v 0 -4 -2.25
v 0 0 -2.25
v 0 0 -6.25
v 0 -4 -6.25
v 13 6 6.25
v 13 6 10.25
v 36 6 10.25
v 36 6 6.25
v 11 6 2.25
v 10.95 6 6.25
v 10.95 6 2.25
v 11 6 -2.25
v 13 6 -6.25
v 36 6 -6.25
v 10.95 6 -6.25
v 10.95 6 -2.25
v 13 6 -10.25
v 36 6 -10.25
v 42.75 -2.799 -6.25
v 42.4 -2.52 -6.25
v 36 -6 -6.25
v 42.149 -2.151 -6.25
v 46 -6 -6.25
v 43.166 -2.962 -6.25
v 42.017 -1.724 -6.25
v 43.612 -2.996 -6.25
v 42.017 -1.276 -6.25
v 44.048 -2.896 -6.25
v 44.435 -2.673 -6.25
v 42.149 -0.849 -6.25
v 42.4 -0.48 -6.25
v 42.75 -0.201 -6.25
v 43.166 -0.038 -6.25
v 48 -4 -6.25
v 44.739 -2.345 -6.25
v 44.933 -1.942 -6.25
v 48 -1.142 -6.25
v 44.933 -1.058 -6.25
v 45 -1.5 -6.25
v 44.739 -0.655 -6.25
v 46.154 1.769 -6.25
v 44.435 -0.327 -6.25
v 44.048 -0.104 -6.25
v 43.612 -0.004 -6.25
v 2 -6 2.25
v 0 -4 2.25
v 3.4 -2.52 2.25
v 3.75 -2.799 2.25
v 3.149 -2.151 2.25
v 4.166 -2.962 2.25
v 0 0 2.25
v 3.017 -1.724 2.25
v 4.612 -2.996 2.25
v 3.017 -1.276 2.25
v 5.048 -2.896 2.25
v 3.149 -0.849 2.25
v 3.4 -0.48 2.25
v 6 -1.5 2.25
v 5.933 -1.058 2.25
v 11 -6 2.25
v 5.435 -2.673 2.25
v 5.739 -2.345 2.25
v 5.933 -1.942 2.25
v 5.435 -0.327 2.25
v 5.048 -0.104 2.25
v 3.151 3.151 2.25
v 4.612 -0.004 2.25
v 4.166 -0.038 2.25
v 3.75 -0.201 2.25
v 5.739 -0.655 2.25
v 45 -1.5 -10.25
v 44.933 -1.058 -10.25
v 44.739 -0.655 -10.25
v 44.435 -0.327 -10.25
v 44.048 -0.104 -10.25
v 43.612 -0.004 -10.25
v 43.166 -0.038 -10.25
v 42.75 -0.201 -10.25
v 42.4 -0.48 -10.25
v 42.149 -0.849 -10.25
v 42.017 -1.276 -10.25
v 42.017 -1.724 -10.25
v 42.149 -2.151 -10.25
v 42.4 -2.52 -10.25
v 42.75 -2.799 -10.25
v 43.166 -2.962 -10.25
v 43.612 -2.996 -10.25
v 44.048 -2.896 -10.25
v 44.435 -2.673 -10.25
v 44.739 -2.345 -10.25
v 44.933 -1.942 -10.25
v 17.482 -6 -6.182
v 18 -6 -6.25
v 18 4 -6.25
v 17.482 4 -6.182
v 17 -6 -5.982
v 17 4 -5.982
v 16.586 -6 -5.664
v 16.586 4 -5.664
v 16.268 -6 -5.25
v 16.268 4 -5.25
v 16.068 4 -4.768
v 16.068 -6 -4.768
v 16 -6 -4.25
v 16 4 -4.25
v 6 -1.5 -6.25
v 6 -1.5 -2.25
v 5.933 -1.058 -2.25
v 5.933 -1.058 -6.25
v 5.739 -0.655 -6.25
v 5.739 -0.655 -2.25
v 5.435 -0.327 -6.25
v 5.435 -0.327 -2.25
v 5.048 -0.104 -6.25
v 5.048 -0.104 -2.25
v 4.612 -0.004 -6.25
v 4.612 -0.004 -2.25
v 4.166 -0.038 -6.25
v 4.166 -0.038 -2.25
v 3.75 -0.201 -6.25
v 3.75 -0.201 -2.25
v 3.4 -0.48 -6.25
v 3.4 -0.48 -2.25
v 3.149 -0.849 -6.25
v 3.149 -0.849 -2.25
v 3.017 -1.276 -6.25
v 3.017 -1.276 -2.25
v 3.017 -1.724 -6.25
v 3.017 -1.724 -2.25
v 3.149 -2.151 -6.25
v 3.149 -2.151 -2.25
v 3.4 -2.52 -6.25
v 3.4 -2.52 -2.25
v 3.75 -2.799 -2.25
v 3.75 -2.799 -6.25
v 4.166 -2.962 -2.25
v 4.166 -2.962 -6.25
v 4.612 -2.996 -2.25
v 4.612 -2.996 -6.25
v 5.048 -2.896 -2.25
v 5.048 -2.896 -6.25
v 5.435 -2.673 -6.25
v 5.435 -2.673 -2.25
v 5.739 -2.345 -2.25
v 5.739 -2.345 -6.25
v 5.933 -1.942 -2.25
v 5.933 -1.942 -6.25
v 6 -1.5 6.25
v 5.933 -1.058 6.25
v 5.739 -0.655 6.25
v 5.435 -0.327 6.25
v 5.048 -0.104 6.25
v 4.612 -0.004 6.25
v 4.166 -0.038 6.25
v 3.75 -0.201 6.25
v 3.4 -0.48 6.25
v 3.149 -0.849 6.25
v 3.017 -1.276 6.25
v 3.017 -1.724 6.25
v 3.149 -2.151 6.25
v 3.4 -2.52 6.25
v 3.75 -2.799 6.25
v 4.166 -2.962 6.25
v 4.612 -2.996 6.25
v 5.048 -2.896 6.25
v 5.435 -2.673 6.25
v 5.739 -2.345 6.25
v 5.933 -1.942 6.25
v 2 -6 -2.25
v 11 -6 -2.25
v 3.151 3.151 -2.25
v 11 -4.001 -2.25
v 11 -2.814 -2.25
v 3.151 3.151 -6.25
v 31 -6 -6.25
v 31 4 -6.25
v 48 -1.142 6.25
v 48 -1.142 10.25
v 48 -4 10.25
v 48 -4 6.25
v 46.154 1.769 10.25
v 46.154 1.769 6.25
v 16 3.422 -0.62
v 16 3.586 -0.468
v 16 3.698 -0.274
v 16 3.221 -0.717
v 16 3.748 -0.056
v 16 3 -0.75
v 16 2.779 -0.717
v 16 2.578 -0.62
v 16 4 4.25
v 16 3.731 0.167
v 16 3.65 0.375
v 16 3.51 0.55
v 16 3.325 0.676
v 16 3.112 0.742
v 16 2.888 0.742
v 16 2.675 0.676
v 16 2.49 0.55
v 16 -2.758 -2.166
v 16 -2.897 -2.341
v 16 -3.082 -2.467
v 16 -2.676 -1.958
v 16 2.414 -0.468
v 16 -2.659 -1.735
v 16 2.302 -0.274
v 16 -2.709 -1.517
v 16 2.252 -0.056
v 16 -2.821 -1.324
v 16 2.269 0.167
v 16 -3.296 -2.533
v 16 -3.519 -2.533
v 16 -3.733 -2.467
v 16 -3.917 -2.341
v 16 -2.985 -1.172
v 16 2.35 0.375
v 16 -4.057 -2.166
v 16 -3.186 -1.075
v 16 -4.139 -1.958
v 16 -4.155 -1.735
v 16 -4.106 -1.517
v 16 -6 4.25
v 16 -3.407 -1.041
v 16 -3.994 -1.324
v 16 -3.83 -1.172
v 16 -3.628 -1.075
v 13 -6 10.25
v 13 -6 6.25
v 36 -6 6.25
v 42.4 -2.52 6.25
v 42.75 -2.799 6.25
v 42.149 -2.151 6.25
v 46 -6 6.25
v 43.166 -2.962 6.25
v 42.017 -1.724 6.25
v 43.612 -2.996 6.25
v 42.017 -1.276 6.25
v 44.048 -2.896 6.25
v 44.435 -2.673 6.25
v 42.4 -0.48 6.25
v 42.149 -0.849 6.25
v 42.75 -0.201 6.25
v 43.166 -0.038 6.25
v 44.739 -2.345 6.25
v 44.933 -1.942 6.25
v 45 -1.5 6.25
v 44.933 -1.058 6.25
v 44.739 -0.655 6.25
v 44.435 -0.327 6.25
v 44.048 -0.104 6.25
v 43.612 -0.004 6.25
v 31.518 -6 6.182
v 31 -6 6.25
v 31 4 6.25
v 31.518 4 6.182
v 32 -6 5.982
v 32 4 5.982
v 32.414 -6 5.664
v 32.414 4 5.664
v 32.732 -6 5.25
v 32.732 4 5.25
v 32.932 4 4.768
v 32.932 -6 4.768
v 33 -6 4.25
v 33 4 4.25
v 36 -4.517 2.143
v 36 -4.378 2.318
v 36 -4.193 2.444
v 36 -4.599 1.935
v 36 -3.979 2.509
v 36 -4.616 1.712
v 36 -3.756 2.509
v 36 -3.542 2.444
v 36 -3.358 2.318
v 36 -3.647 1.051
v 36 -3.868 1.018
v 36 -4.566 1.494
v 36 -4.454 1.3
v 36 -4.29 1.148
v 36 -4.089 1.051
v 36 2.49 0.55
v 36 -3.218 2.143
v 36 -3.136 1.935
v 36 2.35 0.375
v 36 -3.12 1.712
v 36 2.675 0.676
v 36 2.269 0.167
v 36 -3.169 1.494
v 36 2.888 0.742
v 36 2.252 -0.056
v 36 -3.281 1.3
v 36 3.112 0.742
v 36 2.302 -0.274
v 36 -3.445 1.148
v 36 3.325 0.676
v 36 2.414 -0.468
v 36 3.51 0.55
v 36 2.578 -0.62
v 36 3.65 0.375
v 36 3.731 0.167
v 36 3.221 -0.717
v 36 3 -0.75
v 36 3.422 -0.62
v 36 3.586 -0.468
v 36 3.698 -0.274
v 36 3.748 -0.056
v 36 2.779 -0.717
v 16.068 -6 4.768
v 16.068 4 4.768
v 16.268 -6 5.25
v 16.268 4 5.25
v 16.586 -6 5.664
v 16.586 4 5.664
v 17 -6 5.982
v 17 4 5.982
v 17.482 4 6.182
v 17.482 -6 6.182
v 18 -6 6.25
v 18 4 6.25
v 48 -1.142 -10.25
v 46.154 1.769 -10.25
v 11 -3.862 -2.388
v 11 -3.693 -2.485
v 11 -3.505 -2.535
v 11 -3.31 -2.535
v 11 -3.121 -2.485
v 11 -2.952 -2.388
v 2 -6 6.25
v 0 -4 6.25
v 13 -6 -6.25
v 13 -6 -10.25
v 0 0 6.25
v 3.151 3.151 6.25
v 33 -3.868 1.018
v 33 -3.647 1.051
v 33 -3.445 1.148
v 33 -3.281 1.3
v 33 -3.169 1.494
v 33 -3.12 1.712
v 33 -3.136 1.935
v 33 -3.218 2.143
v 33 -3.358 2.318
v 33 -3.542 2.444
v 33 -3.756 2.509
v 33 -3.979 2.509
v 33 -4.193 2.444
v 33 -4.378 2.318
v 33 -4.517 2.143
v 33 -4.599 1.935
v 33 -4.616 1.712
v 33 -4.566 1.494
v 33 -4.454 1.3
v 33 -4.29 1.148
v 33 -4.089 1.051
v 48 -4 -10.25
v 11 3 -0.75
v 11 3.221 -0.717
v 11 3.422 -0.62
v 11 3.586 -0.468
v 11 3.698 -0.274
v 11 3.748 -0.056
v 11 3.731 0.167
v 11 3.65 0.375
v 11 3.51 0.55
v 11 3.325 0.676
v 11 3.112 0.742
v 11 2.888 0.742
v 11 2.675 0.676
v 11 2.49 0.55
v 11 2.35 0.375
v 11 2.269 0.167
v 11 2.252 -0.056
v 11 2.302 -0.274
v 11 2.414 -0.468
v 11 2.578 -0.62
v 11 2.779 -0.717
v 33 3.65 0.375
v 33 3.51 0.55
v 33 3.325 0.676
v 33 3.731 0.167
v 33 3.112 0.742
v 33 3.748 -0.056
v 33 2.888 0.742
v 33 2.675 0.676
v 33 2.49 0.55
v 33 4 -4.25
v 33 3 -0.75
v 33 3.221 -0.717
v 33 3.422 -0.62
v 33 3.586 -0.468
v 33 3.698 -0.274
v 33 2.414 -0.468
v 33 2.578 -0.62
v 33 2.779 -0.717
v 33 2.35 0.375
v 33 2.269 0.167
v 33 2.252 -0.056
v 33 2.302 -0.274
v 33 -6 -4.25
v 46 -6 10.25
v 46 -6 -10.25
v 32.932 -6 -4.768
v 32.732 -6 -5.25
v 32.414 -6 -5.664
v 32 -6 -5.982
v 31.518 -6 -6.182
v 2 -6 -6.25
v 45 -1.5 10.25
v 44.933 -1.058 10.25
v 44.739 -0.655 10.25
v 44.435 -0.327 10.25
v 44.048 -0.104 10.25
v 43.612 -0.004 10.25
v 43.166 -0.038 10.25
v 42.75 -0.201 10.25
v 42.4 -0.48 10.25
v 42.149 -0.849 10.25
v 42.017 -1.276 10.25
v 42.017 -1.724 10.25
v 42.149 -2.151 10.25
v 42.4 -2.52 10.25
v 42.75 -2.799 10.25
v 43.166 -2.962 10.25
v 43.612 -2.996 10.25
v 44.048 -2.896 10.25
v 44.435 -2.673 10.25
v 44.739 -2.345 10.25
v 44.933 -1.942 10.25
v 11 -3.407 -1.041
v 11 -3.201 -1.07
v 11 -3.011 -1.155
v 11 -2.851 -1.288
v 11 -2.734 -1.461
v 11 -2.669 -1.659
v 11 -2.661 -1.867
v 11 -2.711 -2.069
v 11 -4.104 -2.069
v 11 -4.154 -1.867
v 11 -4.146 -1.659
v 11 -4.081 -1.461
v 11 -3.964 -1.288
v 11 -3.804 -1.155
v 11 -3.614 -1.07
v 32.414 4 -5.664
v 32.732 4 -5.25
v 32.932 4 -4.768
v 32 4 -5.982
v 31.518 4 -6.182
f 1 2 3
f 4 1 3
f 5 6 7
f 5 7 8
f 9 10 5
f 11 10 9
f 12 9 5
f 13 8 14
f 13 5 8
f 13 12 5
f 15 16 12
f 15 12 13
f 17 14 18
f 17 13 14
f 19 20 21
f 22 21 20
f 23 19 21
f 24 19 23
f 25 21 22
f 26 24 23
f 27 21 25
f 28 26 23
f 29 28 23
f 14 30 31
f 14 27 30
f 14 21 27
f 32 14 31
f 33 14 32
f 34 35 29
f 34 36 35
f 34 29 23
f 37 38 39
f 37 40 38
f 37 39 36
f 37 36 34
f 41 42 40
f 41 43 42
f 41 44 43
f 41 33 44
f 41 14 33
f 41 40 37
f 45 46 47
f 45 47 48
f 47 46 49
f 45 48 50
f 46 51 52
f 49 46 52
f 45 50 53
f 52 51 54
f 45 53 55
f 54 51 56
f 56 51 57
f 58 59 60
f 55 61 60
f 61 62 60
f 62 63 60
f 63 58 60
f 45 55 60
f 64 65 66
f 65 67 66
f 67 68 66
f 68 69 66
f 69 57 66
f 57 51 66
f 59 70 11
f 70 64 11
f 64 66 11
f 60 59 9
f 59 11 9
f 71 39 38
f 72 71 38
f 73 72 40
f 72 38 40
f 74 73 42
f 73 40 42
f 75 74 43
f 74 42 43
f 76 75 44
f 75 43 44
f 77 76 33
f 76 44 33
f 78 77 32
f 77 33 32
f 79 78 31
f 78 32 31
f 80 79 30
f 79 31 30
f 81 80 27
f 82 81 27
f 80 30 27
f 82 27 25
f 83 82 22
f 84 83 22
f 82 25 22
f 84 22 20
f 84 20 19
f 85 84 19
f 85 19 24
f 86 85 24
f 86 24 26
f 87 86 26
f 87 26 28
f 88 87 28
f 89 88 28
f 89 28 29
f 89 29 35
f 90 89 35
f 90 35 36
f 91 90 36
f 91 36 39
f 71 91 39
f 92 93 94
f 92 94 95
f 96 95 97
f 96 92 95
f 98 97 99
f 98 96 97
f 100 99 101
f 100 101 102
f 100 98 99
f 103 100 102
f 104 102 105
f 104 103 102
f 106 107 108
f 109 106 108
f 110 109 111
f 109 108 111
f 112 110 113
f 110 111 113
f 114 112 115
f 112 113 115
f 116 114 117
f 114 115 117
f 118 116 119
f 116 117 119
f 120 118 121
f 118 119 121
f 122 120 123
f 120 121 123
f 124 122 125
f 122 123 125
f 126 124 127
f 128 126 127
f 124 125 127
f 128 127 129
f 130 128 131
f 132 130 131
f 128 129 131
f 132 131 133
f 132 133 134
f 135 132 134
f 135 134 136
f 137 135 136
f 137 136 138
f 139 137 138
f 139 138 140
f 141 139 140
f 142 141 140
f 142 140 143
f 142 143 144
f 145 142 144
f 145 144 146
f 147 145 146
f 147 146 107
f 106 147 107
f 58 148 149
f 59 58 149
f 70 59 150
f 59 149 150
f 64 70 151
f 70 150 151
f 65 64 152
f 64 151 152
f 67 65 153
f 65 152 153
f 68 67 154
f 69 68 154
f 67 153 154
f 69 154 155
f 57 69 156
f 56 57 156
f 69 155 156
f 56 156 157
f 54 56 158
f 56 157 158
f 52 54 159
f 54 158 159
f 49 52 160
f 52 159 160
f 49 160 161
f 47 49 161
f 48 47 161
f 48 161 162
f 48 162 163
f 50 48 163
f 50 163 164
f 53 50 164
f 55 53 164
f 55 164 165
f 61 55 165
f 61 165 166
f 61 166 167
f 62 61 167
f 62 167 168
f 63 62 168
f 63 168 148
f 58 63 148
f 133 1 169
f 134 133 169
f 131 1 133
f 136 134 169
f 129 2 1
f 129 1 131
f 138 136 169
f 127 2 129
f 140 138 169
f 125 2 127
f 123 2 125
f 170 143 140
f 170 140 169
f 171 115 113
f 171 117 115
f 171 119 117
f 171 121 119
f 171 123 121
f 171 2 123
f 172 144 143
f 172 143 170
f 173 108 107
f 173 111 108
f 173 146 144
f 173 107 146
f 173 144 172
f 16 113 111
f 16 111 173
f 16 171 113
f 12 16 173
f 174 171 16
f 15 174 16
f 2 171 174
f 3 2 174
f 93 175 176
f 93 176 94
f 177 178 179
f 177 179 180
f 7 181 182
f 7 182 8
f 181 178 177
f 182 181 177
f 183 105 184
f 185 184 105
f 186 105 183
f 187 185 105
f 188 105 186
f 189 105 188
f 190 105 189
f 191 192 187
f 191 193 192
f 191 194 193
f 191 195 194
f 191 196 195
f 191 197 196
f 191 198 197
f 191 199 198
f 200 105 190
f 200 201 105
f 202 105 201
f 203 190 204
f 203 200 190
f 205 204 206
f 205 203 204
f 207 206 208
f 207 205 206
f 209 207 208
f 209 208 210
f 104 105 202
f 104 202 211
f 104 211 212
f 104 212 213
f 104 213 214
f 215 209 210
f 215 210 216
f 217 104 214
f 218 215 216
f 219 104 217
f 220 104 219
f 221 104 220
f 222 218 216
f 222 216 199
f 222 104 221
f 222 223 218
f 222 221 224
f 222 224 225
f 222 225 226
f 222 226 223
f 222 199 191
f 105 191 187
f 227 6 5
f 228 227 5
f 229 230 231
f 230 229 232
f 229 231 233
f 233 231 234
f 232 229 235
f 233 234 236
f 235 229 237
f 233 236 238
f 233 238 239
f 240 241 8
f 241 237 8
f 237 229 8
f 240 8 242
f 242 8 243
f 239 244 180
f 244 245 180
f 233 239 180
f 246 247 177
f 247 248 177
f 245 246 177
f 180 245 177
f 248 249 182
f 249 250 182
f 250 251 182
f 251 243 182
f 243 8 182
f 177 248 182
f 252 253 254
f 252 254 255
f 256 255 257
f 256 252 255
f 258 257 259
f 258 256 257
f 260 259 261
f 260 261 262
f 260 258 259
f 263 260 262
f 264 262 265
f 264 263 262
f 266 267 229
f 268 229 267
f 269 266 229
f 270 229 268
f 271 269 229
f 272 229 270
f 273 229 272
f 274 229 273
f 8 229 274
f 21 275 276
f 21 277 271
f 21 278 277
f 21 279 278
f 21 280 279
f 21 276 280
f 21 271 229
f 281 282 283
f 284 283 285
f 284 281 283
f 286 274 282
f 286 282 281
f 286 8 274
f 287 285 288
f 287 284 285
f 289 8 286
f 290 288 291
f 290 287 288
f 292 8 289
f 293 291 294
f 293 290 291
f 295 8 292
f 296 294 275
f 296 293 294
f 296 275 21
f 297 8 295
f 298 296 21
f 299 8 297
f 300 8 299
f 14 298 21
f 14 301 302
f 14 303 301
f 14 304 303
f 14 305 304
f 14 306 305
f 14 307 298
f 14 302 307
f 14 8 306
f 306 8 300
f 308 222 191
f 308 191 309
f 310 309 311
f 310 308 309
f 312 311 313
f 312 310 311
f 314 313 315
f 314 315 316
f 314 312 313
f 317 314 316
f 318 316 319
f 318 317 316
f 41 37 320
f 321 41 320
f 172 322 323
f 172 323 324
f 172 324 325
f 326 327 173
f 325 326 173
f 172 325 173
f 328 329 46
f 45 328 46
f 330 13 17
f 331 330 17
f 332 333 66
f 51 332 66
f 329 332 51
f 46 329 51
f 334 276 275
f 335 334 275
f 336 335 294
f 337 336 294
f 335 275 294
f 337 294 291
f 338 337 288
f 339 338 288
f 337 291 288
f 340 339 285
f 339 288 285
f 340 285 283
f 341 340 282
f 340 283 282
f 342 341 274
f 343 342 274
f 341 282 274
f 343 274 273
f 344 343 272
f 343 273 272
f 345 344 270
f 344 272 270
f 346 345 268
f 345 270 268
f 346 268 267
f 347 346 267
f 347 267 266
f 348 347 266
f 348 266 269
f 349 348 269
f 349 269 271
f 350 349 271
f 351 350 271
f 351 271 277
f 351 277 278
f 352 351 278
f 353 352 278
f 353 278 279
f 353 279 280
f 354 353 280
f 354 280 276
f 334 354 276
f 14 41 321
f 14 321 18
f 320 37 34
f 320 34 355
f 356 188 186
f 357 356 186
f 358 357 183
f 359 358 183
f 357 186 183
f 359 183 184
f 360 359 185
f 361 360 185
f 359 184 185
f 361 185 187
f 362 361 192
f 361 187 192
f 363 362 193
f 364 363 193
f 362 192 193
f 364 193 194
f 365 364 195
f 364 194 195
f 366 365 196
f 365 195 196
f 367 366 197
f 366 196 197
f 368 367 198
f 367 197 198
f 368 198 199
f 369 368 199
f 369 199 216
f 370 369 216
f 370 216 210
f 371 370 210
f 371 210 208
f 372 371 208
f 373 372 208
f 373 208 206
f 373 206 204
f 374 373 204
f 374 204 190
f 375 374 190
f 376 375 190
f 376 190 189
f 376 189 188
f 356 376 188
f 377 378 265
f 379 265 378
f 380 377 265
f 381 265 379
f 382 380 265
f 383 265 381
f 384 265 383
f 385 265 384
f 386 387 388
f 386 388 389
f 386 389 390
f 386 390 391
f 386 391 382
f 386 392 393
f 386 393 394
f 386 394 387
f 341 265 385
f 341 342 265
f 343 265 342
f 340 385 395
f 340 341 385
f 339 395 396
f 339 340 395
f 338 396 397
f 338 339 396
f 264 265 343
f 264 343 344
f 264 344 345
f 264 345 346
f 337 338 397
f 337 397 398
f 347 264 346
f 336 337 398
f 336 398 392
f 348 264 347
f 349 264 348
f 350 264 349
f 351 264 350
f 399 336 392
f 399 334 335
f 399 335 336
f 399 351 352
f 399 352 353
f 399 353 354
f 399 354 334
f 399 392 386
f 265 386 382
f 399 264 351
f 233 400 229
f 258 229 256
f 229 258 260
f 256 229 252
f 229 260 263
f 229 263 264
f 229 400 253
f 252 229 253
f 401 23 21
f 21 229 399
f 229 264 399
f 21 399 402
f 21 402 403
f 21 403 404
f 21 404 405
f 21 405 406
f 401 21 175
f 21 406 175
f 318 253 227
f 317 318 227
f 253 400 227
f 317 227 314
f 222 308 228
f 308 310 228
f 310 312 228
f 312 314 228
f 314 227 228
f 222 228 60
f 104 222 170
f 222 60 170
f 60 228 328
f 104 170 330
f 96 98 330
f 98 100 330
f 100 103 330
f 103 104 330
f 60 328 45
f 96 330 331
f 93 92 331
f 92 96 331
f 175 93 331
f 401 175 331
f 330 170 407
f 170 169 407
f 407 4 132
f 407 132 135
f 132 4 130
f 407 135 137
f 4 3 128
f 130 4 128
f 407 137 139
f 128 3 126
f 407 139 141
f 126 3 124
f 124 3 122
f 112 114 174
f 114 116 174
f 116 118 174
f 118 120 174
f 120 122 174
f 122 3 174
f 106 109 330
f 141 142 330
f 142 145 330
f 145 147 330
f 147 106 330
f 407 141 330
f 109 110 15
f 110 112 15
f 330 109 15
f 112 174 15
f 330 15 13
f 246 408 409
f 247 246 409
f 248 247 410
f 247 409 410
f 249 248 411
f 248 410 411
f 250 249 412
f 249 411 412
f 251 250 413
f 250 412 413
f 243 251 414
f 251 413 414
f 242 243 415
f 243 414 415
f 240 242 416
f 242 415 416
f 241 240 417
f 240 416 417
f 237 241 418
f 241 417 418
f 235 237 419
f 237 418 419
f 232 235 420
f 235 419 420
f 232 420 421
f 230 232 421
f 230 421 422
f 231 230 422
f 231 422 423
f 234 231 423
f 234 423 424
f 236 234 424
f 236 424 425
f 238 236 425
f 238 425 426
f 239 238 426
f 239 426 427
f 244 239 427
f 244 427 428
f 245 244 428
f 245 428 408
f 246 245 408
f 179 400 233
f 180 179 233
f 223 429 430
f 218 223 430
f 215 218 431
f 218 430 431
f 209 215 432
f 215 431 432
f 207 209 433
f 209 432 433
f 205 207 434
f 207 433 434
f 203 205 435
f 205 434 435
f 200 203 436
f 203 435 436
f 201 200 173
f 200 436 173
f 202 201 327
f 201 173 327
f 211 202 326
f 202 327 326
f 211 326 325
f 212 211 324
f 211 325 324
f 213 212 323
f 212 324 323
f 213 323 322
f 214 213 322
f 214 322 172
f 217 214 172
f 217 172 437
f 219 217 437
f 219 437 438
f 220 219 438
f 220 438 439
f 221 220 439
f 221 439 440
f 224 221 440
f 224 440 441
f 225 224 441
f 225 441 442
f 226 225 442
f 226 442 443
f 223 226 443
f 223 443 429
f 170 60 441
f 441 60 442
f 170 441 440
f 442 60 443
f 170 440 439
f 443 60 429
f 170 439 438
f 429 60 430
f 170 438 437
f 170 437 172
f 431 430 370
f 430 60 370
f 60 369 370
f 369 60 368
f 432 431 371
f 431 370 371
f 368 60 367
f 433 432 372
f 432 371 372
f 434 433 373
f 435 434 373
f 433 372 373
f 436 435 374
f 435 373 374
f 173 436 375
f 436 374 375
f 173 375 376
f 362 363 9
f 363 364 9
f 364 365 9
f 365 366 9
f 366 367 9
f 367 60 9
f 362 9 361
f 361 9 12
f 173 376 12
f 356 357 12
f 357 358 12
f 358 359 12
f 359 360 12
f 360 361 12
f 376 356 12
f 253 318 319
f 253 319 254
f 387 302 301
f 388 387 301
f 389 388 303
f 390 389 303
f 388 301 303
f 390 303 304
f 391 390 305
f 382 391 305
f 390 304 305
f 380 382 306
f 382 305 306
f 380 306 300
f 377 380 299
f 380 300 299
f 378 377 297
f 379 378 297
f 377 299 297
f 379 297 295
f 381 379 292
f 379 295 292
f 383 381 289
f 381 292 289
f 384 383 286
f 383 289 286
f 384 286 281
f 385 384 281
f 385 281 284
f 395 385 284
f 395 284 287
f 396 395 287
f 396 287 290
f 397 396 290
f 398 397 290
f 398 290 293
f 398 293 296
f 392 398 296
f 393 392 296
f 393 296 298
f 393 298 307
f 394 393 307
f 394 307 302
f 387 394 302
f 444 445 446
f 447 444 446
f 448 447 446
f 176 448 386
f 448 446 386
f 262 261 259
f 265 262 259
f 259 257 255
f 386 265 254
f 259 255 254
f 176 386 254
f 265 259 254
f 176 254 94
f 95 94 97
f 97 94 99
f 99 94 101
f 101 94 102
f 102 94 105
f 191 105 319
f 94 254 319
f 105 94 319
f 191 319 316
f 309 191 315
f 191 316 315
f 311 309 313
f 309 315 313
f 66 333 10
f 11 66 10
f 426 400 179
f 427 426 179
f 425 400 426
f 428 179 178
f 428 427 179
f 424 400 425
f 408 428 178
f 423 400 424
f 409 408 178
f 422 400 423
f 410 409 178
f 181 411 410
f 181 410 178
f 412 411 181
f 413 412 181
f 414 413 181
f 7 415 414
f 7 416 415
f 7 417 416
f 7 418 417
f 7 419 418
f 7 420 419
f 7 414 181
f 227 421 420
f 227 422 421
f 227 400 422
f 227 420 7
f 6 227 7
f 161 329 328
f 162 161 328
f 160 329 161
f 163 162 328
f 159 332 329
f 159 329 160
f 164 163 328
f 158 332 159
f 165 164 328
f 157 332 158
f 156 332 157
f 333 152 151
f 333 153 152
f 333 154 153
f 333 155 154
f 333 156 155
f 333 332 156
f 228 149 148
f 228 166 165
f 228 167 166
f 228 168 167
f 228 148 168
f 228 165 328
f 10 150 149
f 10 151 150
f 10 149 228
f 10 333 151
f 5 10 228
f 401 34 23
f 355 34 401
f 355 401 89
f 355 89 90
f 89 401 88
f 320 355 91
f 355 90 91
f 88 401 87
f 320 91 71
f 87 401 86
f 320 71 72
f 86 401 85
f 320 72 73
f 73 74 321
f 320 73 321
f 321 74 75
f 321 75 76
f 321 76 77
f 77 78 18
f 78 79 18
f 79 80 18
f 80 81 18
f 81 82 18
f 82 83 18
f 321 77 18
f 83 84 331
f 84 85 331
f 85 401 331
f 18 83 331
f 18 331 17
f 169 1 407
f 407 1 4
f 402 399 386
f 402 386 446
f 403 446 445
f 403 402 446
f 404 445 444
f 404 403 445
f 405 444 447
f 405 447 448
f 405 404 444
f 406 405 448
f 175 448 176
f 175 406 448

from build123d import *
from OCP.BRepFilletAPI import BRepFilletAPI_MakeChamfer

# Parameters (mm, degrees)
SKETCH_2_W            = 20.5
SKETCH_2_H            = 12
EXTRUDE_1_DEPTH       = 48
SKETCH_3_W            = 22
SKETCH_3_H            = 4.5
CUT_EXTRUDE_1_DEPTH   = 51.527838861
SKETCH_5_W            = 12
SKETCH_5_H            = 12.5
CUT_EXTRUDE_2_DEPTH   = 51.527838861
SKETCH_7_R            = 0.75
CUT_EXTRUDE_3_DEPTH   = 38.908607202
SKETCH_10_W           = 19.106520138
SKETCH_10_H           = 8.950699496
CUT_EXTRUDE_3_2_DEPTH = 51.527838861
SKETCH_11_R           = 1.5
CUT_EXTRUDE_6_DEPTH   = 52.110175112
SKETCH_9_R            = 1.5
CUT_EXTRUDE_5_DEPTH   = 53.538081427
SKETCH_12_R           = 0.75
CUT_EXTRUDE_4_DEPTH   = 12
CUT_EXTRUDE_7_DEPTH   = 53.538081427
CHAMFER_5_SIZE        = 2
CHAMFER_5_SIZE2       = 3.354740363
CHAMFER_6_SIZE        = 2
CHAMFER_6_SIZE2       = 2.1420728
SKETCH_14_R           = 0.75
CUT_EXTRUDE_5_2_DEPTH = 5
CUT_EXTRUDE_8_DEPTH   = 10


with BuildPart() as part:
    # Эскиз2 → Вытянуть1 (new body)
    with BuildSketch(Plane(origin=(0, 0, 0), x_dir=(0, 0, -1), z_dir=(1, 0, 0))):
        Rectangle(SKETCH_2_W, SKETCH_2_H)
    extrude(amount=EXTRUDE_1_DEPTH)

    # Эскиз3 → Вырез-Вытянуть1 (cut, through all)
    with BuildSketch(Plane(origin=(0, 6, 0), x_dir=(1, 0, 0), z_dir=(0, 1, 0))):
        Rectangle(SKETCH_3_W, SKETCH_3_H)
    extrude(amount=-CUT_EXTRUDE_1_DEPTH, mode=Mode.SUBTRACT)

    # Эскиз5 → Вырез-Вытянуть2 (cut, through all)
    with BuildSketch(Plane(origin=(0, 6, 0), x_dir=(1, 0, 0), z_dir=(0, 1, 0))):
        with Locations((42, 0)):
            Rectangle(SKETCH_5_W, SKETCH_5_H)
    extrude(amount=-CUT_EXTRUDE_2_DEPTH, mode=Mode.SUBTRACT)

    # Эскиз7 → Cut-Extrude 3 (cut, through all)
    with BuildSketch(Plane(origin=(36, 0, 0), x_dir=(0, 0, -1), z_dir=(1, 0, 0))):
        with Locations((0, 3)):
            Circle(SKETCH_7_R)
    extrude(amount=-CUT_EXTRUDE_3_DEPTH, mode=Mode.SUBTRACT)

    # Эскиз10 → Cut-Extrude 3 2 (cut, through all)
    with BuildSketch(Plane(origin=(0, 6, 0), x_dir=(1, 0, 0), z_dir=(0, 1, 0))):
        with Locations((3.446739931, 10.725349748)):
            Rectangle(SKETCH_10_W, SKETCH_10_H)
        with Locations((3.446739931, -10.725349748)):
            Rectangle(SKETCH_10_W, SKETCH_10_H)
    extrude(amount=-CUT_EXTRUDE_3_2_DEPTH, mode=Mode.SUBTRACT)

    # Эскиз11 → Вытянуть6 (cut, through all)
    with BuildSketch(Plane.XY.offset(6.25)):
        with Locations((4.5, -1.5)):
            Circle(SKETCH_11_R)
    extrude(amount=-CUT_EXTRUDE_6_DEPTH, mode=Mode.SUBTRACT)

    # Эскиз9 → Cut-Extrude 5 (cut, through all)
    with BuildSketch(Plane.XY.offset(10.25)):
        with Locations((43.5, -1.5)):
            Circle(SKETCH_9_R)
    extrude(amount=-CUT_EXTRUDE_5_DEPTH, mode=Mode.SUBTRACT)

    # Эскиз12 → Вырез-Вытянуть4 (cut)
    with BuildSketch(Plane.ZY.offset(-11)):
        with Locations((-1.791386219, -3.407348241)):
            Circle(SKETCH_12_R)
    extrude(amount=-CUT_EXTRUDE_4_DEPTH, mode=Mode.SUBTRACT)

    # Эскиз13 → Вытянуть7 (cut, through all)
    with BuildSketch(Plane.XY.offset(10.25)):
        Polygon((10.95, 6), (0, 6), (0, 2), align=None)
        Polygon((48, 6), (48, 1), (36, 6), align=None)
    extrude(amount=-CUT_EXTRUDE_7_DEPTH, mode=Mode.SUBTRACT)

    # Фаска5: one chamfer whose edges measure the first distance from different faces: ONE call of the kernel's chamfer builder (chamfer() names one face for all edges)
    chamfer_5_edges_1 = [part.edges().sort_by_distance(p)[0] for p in [
        (0, -6, 4.25),
        (0, -6, -4.25),
        (48, -6, -8.25),
        (48, -6, 8.25),
    ]]
    chamfer_5_edges_2 = [part.edges().sort_by_distance(p)[0] for p in [
        (0, 2, 4.25),
    ]]
    chamfer_5_side_2 = [part.faces().sort_by_distance(p)[0] for p in [
        (0, -2, 4.25),
    ]]
    chamfer_5_edges_3 = [part.edges().sort_by_distance(p)[0] for p in [
        (0, 2, -4.25),
    ]]
    chamfer_5_side_3 = [part.faces().sort_by_distance(p)[0] for p in [
        (0, -2, -4.25),
    ]]
    chamfer_5 = BRepFilletAPI_MakeChamfer(part.part.solid().wrapped)
    for e in chamfer_5_edges_1:
        chamfer_5.Add(CHAMFER_5_SIZE, e.wrapped)
    for e in chamfer_5_edges_2:
        chamfer_5.Add(CHAMFER_5_SIZE, CHAMFER_5_SIZE2, e.wrapped, chamfer_5_side_2[0].wrapped)  # the first distance lies on this face
    for e in chamfer_5_edges_3:
        chamfer_5.Add(CHAMFER_5_SIZE, CHAMFER_5_SIZE2, e.wrapped, chamfer_5_side_3[0].wrapped)  # the first distance lies on this face
    add(Compound.cast(chamfer_5.Shape()), mode=Mode.REPLACE)

    # Фаска6: one chamfer whose edges measure the first distance from different faces: ONE call of the kernel's chamfer builder (chamfer() names one face for all edges)
    chamfer_6_edges_1 = [part.edges().sort_by_distance(p)[0] for p in [
        (48, 1, -8.25),
    ]]
    chamfer_6_side_1 = [part.faces().sort_by_distance(p)[0] for p in [
        (42, 3.5, -8.25),
    ]]
    chamfer_6_edges_2 = [part.edges().sort_by_distance(p)[0] for p in [
        (48, 1, 8.25),
    ]]
    chamfer_6_side_2 = [part.faces().sort_by_distance(p)[0] for p in [
        (42, 3.5, 8.25),
    ]]
    chamfer_6 = BRepFilletAPI_MakeChamfer(part.part.solid().wrapped)
    for e in chamfer_6_edges_1:
        chamfer_6.Add(CHAMFER_6_SIZE, CHAMFER_6_SIZE2, e.wrapped, chamfer_6_side_1[0].wrapped)  # the first distance lies on this face
    for e in chamfer_6_edges_2:
        chamfer_6.Add(CHAMFER_6_SIZE, CHAMFER_6_SIZE2, e.wrapped, chamfer_6_side_2[0].wrapped)  # the first distance lies on this face
    add(Compound.cast(chamfer_6.Shape()), mode=Mode.REPLACE)

    # Эскиз14 → Cut-Extrude 5 2 (cut)
    with BuildSketch(Plane(origin=(36, 0, 0), x_dir=(0, 0, -1), z_dir=(1, 0, 0))):
        with Locations((-1.767861063, -3.867641423)):
            Circle(SKETCH_14_R)
    extrude(amount=-CUT_EXTRUDE_5_2_DEPTH, mode=Mode.SUBTRACT)

    # Эскиз15 → Вытянуть8 (cut)
    with BuildSketch(Plane.XZ.offset(6)):
        with BuildLine():
            Line((18, 6.25), (31, 6.25))
            ThreePointArc((31, 6.25), (32.414213562, 5.664213562), (33, 4.25))
            Line((33, 4.25), (33, -4.25))
            ThreePointArc((33, -4.25), (32.414213562, -5.664213562), (31, -6.25))
            Line((31, -6.25), (18, -6.25))
            ThreePointArc((18, -6.25), (16.585786438, -5.664213562), (16, -4.25))
            Line((16, -4.25), (16, 4.25))
            ThreePointArc((16, 4.25), (16.585786438, 5.664213562), (18, 6.25))
        make_face()
    extrude(amount=-CUT_EXTRUDE_8_DEPTH, mode=Mode.SUBTRACT)


solid = part.part
